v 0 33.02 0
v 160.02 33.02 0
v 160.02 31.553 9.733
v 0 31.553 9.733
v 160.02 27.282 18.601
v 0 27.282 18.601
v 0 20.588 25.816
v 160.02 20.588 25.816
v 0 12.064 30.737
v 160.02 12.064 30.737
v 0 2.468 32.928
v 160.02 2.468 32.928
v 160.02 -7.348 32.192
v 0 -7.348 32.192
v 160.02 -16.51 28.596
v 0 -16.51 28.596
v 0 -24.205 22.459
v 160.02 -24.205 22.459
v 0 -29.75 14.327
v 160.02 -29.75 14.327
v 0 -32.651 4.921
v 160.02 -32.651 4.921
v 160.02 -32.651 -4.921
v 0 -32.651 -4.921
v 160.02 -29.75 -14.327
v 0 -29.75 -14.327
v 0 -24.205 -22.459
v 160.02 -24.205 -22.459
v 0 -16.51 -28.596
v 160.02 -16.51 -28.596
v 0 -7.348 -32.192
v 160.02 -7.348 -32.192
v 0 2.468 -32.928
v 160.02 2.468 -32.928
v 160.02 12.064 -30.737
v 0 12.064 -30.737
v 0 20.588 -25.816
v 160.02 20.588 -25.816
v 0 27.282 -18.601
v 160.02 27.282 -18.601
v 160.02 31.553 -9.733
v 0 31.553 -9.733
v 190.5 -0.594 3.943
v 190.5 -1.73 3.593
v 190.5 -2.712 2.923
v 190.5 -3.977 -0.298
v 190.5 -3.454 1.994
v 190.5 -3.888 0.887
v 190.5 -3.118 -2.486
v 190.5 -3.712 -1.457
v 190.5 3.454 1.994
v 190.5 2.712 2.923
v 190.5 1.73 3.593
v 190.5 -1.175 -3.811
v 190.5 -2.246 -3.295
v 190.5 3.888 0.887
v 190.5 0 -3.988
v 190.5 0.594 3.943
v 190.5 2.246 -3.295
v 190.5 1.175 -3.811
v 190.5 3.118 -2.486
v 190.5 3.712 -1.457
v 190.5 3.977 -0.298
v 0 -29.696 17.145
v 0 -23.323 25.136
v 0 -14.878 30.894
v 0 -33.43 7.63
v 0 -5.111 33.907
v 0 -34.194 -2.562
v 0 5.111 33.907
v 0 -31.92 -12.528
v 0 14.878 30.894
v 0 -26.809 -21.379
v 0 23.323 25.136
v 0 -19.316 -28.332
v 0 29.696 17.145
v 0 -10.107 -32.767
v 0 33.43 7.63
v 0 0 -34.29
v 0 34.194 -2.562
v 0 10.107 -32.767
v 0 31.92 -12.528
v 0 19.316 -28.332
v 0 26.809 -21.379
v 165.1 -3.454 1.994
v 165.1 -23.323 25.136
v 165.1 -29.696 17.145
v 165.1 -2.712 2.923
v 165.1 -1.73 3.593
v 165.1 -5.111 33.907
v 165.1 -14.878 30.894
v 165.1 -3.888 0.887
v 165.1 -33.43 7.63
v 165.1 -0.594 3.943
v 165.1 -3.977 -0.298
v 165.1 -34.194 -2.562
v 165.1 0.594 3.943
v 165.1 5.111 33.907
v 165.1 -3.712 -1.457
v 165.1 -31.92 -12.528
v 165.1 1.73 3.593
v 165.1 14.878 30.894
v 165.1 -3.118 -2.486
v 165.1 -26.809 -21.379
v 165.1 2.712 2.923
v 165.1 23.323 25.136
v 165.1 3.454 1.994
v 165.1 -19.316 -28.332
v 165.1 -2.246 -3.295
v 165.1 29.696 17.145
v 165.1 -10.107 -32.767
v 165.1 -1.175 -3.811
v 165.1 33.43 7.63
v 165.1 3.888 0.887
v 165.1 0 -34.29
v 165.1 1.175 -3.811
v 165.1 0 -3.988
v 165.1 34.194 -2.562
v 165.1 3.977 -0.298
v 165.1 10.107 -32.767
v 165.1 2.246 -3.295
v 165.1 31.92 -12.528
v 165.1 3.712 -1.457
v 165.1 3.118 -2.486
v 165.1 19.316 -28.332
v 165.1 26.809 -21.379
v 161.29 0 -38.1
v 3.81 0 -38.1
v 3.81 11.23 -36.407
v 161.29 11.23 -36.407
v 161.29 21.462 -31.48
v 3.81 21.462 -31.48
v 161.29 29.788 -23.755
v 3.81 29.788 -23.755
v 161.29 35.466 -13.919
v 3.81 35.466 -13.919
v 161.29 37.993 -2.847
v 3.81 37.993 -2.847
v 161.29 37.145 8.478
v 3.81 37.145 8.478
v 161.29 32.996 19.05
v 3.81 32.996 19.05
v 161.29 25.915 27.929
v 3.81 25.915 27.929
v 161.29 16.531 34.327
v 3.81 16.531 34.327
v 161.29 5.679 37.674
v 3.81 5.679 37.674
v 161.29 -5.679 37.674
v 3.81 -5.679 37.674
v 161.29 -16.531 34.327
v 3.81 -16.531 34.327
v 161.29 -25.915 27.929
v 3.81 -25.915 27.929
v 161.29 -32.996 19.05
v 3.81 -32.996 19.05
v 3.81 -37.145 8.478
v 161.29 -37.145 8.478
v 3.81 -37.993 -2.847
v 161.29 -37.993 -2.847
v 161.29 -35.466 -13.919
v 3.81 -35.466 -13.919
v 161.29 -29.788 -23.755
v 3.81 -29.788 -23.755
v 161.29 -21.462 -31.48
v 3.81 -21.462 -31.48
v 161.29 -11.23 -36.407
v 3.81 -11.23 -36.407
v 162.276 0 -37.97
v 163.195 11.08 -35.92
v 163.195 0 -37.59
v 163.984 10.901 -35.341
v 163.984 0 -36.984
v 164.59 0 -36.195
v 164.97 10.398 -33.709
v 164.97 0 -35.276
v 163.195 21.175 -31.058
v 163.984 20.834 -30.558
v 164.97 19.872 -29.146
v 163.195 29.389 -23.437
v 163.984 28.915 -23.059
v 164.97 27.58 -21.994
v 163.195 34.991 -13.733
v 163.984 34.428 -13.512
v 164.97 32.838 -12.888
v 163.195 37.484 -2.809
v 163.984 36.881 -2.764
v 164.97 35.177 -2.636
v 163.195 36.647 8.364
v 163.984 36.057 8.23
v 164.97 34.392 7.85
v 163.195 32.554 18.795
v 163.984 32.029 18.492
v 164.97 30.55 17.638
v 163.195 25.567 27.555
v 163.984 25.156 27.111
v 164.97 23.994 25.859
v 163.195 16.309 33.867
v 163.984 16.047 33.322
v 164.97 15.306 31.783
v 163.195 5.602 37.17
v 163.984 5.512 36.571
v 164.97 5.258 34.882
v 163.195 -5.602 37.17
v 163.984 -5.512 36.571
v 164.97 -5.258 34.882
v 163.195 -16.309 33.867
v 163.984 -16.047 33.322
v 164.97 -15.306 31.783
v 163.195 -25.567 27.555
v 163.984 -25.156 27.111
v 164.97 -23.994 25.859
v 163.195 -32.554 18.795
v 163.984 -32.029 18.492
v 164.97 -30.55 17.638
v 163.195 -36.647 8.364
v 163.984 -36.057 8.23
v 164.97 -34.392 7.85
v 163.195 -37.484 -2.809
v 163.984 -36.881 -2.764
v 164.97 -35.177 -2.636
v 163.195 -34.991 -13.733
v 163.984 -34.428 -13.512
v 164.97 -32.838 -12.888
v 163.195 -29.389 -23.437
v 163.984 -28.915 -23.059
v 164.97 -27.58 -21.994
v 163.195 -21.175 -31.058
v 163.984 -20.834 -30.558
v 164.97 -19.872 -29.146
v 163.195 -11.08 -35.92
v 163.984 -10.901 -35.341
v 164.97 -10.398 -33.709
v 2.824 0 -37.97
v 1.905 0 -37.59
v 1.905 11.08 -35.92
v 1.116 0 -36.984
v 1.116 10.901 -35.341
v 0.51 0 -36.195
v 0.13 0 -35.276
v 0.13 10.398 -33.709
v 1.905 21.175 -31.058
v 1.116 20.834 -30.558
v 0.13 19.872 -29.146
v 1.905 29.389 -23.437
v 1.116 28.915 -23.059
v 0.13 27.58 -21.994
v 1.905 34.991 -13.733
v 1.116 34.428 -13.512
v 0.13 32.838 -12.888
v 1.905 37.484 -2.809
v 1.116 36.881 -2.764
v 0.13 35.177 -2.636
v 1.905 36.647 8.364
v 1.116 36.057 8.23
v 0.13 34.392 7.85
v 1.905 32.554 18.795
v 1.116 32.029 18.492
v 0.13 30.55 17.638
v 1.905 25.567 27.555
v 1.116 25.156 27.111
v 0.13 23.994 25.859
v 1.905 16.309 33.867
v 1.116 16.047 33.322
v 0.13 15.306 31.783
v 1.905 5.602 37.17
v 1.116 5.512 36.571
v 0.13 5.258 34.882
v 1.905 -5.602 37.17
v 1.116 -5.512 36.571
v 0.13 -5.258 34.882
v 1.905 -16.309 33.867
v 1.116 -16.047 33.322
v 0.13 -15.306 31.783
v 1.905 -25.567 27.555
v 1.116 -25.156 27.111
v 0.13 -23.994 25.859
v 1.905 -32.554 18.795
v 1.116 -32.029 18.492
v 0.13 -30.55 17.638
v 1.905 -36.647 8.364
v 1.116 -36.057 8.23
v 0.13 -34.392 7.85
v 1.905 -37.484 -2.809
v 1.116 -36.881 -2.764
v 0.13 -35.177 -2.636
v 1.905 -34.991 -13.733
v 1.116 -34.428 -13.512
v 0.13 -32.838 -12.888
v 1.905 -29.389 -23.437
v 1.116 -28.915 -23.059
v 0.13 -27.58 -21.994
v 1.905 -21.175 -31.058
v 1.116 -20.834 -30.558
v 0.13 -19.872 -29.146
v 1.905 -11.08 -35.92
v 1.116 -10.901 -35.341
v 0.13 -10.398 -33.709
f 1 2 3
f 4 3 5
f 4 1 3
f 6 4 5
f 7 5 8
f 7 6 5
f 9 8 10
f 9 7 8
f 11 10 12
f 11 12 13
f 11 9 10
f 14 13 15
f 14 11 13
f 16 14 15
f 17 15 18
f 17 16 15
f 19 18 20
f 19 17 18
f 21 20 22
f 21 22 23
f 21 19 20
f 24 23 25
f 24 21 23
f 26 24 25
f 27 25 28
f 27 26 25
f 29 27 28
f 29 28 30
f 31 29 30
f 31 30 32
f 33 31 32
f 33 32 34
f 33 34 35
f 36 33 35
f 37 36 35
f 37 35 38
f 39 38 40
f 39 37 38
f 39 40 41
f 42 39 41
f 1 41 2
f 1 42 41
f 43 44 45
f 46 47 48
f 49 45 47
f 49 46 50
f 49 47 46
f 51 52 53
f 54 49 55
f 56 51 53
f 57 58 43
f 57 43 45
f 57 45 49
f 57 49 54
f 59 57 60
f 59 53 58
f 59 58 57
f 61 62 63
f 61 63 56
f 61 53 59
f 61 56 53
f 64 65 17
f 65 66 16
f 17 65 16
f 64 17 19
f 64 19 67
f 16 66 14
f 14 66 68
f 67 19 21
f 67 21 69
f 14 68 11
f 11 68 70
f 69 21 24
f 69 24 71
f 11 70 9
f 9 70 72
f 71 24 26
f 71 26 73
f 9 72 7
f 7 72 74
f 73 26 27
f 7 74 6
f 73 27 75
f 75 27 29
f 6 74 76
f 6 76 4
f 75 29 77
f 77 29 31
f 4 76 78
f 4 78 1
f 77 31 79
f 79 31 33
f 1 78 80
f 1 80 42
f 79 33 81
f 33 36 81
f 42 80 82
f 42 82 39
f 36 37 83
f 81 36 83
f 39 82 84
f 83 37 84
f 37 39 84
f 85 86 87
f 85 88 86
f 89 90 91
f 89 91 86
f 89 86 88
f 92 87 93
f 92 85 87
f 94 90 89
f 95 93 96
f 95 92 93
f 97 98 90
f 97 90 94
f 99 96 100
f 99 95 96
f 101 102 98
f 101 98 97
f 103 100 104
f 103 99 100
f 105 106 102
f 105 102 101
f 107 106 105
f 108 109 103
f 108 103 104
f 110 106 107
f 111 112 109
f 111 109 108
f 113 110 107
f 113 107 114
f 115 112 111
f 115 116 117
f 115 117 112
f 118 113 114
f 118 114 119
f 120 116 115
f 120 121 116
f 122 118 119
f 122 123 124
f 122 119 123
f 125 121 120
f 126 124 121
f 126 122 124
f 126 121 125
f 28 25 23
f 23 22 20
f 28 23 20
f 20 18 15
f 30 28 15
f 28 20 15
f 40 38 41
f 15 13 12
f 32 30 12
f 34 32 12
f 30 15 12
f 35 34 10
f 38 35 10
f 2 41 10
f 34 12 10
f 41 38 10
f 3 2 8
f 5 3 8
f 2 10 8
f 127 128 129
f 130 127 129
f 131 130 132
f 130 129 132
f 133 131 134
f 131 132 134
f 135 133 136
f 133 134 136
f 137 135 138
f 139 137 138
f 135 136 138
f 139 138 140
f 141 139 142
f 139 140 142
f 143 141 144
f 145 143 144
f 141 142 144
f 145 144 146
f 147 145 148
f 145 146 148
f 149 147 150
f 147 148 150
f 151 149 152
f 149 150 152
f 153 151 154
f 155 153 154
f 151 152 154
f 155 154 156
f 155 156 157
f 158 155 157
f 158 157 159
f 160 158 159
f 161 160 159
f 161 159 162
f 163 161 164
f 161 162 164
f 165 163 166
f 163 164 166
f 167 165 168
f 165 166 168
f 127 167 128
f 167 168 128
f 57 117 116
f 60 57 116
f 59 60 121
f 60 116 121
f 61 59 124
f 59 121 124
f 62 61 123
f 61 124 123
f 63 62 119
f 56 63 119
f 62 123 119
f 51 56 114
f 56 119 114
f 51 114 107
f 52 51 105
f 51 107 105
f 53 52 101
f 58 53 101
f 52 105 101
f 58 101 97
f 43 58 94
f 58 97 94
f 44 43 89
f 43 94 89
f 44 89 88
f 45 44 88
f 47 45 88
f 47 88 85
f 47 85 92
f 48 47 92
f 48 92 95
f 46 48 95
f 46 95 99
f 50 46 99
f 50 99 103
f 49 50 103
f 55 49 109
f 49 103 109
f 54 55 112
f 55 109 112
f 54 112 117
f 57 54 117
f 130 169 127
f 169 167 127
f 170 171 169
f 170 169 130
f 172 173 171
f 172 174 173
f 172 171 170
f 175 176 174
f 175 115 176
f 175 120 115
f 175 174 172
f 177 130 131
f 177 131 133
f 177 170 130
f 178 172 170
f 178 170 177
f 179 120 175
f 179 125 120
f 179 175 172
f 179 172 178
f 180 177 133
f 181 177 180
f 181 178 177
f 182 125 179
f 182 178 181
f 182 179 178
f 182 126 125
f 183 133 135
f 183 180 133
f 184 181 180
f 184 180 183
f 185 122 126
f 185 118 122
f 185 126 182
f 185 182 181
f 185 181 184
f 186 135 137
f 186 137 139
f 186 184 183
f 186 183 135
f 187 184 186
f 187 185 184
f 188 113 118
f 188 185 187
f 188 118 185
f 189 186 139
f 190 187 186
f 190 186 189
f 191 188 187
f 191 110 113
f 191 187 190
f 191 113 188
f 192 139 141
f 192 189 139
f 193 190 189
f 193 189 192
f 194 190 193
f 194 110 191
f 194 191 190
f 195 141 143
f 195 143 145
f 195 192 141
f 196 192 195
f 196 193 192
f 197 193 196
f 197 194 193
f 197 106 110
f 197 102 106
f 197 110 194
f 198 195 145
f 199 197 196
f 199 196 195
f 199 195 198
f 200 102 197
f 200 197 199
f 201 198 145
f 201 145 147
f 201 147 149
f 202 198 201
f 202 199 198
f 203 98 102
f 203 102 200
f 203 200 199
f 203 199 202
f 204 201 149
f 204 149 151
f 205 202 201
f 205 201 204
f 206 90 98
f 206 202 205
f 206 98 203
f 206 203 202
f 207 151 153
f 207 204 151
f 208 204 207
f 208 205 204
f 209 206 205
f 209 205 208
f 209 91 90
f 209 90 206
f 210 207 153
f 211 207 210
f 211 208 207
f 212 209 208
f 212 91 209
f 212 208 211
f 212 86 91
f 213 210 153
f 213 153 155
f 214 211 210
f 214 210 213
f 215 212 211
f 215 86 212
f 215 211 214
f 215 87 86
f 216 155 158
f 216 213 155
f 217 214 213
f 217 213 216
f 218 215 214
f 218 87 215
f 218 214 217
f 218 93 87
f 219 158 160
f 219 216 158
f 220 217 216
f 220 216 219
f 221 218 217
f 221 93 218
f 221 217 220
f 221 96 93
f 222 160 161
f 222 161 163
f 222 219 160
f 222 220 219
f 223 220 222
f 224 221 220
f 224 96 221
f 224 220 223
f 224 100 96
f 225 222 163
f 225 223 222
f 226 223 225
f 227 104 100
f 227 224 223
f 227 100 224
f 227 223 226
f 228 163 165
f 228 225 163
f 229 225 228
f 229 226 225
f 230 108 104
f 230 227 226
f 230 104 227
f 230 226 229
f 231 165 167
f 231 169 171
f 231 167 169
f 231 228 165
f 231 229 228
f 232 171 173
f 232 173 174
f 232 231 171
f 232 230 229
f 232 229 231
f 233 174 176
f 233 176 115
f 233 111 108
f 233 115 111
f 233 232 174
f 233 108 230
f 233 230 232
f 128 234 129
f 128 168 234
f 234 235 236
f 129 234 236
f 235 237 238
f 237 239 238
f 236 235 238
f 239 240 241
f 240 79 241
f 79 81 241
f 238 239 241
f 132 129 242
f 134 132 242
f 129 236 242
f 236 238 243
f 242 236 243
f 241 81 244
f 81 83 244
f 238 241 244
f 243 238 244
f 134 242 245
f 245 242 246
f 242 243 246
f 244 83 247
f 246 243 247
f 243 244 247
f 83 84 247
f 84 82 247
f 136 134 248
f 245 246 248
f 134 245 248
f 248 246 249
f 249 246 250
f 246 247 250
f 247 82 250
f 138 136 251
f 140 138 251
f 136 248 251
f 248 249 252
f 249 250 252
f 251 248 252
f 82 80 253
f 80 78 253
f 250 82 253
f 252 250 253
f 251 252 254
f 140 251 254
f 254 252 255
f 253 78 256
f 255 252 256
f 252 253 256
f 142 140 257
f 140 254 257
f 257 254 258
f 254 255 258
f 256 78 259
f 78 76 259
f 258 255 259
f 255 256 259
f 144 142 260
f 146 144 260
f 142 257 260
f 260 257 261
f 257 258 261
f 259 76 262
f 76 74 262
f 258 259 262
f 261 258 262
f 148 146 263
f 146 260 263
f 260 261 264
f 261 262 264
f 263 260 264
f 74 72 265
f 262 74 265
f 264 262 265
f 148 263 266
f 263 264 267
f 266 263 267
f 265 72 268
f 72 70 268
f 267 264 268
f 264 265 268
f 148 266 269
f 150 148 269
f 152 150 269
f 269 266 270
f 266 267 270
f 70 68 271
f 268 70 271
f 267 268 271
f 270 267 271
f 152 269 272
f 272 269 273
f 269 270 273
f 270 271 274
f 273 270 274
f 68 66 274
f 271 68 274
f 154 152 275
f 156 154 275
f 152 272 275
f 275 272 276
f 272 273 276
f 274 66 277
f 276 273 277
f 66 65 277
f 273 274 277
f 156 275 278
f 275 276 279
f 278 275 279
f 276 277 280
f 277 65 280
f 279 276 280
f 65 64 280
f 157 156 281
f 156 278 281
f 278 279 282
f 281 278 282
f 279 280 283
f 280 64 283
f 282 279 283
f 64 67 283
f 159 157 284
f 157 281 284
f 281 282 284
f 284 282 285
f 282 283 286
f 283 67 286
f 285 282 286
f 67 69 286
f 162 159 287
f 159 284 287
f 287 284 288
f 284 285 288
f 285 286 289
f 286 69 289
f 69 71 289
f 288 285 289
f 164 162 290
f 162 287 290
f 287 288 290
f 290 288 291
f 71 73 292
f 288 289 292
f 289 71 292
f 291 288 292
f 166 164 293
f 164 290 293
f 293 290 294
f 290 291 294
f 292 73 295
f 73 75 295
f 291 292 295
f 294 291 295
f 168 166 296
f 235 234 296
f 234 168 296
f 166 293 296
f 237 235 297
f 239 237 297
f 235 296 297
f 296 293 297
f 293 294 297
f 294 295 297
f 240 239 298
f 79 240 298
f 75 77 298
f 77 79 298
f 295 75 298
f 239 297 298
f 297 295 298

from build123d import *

# Parameters (mm, degrees)
SKETCH1_R           = 38.1
BOSS_EXTRUDE1_DEPTH = 165.1
SKETCH2_R           = 3.9878
BOSS_EXTRUDE2_DEPTH = 25.4
FILLET1_R           = 3.81
SHELL2_OUTLINE_R    = 33.02
SHELL2_DEPTH        = 160.02


# Read off the part's stored shape, not the designer's step: Shell2
with BuildPart() as part:
    # Sketch1 → Boss-Extrude1 (new body)
    with BuildSketch(Plane(origin=(0, 0, 0), x_dir=(0, 0, -1), z_dir=(1, 0, 0))):
        Circle(SKETCH1_R)
    extrude(amount=BOSS_EXTRUDE1_DEPTH)

    # Sketch2 → Boss-Extrude2 (add)
    with BuildSketch(Plane(origin=(165.1, 0, 0), x_dir=(0, 0, -1), z_dir=(1, 0, 0))):
        Circle(SKETCH2_R)
    extrude(amount=BOSS_EXTRUDE2_DEPTH)

    # Fillet1
    fillet1_edges = [part.edges().sort_by_distance(p)[0] for p in [
        (0, 0, 38.1),
        (165.1, 0, 38.1),
    ]]
    fillet(fillet1_edges, radius=FILLET1_R)

    # Shell2 outline → Shell2 (cut)
    with BuildSketch(Plane.YZ):
        Circle(SHELL2_OUTLINE_R)
    extrude(amount=SHELL2_DEPTH, mode=Mode.SUBTRACT)


solid = part.part
